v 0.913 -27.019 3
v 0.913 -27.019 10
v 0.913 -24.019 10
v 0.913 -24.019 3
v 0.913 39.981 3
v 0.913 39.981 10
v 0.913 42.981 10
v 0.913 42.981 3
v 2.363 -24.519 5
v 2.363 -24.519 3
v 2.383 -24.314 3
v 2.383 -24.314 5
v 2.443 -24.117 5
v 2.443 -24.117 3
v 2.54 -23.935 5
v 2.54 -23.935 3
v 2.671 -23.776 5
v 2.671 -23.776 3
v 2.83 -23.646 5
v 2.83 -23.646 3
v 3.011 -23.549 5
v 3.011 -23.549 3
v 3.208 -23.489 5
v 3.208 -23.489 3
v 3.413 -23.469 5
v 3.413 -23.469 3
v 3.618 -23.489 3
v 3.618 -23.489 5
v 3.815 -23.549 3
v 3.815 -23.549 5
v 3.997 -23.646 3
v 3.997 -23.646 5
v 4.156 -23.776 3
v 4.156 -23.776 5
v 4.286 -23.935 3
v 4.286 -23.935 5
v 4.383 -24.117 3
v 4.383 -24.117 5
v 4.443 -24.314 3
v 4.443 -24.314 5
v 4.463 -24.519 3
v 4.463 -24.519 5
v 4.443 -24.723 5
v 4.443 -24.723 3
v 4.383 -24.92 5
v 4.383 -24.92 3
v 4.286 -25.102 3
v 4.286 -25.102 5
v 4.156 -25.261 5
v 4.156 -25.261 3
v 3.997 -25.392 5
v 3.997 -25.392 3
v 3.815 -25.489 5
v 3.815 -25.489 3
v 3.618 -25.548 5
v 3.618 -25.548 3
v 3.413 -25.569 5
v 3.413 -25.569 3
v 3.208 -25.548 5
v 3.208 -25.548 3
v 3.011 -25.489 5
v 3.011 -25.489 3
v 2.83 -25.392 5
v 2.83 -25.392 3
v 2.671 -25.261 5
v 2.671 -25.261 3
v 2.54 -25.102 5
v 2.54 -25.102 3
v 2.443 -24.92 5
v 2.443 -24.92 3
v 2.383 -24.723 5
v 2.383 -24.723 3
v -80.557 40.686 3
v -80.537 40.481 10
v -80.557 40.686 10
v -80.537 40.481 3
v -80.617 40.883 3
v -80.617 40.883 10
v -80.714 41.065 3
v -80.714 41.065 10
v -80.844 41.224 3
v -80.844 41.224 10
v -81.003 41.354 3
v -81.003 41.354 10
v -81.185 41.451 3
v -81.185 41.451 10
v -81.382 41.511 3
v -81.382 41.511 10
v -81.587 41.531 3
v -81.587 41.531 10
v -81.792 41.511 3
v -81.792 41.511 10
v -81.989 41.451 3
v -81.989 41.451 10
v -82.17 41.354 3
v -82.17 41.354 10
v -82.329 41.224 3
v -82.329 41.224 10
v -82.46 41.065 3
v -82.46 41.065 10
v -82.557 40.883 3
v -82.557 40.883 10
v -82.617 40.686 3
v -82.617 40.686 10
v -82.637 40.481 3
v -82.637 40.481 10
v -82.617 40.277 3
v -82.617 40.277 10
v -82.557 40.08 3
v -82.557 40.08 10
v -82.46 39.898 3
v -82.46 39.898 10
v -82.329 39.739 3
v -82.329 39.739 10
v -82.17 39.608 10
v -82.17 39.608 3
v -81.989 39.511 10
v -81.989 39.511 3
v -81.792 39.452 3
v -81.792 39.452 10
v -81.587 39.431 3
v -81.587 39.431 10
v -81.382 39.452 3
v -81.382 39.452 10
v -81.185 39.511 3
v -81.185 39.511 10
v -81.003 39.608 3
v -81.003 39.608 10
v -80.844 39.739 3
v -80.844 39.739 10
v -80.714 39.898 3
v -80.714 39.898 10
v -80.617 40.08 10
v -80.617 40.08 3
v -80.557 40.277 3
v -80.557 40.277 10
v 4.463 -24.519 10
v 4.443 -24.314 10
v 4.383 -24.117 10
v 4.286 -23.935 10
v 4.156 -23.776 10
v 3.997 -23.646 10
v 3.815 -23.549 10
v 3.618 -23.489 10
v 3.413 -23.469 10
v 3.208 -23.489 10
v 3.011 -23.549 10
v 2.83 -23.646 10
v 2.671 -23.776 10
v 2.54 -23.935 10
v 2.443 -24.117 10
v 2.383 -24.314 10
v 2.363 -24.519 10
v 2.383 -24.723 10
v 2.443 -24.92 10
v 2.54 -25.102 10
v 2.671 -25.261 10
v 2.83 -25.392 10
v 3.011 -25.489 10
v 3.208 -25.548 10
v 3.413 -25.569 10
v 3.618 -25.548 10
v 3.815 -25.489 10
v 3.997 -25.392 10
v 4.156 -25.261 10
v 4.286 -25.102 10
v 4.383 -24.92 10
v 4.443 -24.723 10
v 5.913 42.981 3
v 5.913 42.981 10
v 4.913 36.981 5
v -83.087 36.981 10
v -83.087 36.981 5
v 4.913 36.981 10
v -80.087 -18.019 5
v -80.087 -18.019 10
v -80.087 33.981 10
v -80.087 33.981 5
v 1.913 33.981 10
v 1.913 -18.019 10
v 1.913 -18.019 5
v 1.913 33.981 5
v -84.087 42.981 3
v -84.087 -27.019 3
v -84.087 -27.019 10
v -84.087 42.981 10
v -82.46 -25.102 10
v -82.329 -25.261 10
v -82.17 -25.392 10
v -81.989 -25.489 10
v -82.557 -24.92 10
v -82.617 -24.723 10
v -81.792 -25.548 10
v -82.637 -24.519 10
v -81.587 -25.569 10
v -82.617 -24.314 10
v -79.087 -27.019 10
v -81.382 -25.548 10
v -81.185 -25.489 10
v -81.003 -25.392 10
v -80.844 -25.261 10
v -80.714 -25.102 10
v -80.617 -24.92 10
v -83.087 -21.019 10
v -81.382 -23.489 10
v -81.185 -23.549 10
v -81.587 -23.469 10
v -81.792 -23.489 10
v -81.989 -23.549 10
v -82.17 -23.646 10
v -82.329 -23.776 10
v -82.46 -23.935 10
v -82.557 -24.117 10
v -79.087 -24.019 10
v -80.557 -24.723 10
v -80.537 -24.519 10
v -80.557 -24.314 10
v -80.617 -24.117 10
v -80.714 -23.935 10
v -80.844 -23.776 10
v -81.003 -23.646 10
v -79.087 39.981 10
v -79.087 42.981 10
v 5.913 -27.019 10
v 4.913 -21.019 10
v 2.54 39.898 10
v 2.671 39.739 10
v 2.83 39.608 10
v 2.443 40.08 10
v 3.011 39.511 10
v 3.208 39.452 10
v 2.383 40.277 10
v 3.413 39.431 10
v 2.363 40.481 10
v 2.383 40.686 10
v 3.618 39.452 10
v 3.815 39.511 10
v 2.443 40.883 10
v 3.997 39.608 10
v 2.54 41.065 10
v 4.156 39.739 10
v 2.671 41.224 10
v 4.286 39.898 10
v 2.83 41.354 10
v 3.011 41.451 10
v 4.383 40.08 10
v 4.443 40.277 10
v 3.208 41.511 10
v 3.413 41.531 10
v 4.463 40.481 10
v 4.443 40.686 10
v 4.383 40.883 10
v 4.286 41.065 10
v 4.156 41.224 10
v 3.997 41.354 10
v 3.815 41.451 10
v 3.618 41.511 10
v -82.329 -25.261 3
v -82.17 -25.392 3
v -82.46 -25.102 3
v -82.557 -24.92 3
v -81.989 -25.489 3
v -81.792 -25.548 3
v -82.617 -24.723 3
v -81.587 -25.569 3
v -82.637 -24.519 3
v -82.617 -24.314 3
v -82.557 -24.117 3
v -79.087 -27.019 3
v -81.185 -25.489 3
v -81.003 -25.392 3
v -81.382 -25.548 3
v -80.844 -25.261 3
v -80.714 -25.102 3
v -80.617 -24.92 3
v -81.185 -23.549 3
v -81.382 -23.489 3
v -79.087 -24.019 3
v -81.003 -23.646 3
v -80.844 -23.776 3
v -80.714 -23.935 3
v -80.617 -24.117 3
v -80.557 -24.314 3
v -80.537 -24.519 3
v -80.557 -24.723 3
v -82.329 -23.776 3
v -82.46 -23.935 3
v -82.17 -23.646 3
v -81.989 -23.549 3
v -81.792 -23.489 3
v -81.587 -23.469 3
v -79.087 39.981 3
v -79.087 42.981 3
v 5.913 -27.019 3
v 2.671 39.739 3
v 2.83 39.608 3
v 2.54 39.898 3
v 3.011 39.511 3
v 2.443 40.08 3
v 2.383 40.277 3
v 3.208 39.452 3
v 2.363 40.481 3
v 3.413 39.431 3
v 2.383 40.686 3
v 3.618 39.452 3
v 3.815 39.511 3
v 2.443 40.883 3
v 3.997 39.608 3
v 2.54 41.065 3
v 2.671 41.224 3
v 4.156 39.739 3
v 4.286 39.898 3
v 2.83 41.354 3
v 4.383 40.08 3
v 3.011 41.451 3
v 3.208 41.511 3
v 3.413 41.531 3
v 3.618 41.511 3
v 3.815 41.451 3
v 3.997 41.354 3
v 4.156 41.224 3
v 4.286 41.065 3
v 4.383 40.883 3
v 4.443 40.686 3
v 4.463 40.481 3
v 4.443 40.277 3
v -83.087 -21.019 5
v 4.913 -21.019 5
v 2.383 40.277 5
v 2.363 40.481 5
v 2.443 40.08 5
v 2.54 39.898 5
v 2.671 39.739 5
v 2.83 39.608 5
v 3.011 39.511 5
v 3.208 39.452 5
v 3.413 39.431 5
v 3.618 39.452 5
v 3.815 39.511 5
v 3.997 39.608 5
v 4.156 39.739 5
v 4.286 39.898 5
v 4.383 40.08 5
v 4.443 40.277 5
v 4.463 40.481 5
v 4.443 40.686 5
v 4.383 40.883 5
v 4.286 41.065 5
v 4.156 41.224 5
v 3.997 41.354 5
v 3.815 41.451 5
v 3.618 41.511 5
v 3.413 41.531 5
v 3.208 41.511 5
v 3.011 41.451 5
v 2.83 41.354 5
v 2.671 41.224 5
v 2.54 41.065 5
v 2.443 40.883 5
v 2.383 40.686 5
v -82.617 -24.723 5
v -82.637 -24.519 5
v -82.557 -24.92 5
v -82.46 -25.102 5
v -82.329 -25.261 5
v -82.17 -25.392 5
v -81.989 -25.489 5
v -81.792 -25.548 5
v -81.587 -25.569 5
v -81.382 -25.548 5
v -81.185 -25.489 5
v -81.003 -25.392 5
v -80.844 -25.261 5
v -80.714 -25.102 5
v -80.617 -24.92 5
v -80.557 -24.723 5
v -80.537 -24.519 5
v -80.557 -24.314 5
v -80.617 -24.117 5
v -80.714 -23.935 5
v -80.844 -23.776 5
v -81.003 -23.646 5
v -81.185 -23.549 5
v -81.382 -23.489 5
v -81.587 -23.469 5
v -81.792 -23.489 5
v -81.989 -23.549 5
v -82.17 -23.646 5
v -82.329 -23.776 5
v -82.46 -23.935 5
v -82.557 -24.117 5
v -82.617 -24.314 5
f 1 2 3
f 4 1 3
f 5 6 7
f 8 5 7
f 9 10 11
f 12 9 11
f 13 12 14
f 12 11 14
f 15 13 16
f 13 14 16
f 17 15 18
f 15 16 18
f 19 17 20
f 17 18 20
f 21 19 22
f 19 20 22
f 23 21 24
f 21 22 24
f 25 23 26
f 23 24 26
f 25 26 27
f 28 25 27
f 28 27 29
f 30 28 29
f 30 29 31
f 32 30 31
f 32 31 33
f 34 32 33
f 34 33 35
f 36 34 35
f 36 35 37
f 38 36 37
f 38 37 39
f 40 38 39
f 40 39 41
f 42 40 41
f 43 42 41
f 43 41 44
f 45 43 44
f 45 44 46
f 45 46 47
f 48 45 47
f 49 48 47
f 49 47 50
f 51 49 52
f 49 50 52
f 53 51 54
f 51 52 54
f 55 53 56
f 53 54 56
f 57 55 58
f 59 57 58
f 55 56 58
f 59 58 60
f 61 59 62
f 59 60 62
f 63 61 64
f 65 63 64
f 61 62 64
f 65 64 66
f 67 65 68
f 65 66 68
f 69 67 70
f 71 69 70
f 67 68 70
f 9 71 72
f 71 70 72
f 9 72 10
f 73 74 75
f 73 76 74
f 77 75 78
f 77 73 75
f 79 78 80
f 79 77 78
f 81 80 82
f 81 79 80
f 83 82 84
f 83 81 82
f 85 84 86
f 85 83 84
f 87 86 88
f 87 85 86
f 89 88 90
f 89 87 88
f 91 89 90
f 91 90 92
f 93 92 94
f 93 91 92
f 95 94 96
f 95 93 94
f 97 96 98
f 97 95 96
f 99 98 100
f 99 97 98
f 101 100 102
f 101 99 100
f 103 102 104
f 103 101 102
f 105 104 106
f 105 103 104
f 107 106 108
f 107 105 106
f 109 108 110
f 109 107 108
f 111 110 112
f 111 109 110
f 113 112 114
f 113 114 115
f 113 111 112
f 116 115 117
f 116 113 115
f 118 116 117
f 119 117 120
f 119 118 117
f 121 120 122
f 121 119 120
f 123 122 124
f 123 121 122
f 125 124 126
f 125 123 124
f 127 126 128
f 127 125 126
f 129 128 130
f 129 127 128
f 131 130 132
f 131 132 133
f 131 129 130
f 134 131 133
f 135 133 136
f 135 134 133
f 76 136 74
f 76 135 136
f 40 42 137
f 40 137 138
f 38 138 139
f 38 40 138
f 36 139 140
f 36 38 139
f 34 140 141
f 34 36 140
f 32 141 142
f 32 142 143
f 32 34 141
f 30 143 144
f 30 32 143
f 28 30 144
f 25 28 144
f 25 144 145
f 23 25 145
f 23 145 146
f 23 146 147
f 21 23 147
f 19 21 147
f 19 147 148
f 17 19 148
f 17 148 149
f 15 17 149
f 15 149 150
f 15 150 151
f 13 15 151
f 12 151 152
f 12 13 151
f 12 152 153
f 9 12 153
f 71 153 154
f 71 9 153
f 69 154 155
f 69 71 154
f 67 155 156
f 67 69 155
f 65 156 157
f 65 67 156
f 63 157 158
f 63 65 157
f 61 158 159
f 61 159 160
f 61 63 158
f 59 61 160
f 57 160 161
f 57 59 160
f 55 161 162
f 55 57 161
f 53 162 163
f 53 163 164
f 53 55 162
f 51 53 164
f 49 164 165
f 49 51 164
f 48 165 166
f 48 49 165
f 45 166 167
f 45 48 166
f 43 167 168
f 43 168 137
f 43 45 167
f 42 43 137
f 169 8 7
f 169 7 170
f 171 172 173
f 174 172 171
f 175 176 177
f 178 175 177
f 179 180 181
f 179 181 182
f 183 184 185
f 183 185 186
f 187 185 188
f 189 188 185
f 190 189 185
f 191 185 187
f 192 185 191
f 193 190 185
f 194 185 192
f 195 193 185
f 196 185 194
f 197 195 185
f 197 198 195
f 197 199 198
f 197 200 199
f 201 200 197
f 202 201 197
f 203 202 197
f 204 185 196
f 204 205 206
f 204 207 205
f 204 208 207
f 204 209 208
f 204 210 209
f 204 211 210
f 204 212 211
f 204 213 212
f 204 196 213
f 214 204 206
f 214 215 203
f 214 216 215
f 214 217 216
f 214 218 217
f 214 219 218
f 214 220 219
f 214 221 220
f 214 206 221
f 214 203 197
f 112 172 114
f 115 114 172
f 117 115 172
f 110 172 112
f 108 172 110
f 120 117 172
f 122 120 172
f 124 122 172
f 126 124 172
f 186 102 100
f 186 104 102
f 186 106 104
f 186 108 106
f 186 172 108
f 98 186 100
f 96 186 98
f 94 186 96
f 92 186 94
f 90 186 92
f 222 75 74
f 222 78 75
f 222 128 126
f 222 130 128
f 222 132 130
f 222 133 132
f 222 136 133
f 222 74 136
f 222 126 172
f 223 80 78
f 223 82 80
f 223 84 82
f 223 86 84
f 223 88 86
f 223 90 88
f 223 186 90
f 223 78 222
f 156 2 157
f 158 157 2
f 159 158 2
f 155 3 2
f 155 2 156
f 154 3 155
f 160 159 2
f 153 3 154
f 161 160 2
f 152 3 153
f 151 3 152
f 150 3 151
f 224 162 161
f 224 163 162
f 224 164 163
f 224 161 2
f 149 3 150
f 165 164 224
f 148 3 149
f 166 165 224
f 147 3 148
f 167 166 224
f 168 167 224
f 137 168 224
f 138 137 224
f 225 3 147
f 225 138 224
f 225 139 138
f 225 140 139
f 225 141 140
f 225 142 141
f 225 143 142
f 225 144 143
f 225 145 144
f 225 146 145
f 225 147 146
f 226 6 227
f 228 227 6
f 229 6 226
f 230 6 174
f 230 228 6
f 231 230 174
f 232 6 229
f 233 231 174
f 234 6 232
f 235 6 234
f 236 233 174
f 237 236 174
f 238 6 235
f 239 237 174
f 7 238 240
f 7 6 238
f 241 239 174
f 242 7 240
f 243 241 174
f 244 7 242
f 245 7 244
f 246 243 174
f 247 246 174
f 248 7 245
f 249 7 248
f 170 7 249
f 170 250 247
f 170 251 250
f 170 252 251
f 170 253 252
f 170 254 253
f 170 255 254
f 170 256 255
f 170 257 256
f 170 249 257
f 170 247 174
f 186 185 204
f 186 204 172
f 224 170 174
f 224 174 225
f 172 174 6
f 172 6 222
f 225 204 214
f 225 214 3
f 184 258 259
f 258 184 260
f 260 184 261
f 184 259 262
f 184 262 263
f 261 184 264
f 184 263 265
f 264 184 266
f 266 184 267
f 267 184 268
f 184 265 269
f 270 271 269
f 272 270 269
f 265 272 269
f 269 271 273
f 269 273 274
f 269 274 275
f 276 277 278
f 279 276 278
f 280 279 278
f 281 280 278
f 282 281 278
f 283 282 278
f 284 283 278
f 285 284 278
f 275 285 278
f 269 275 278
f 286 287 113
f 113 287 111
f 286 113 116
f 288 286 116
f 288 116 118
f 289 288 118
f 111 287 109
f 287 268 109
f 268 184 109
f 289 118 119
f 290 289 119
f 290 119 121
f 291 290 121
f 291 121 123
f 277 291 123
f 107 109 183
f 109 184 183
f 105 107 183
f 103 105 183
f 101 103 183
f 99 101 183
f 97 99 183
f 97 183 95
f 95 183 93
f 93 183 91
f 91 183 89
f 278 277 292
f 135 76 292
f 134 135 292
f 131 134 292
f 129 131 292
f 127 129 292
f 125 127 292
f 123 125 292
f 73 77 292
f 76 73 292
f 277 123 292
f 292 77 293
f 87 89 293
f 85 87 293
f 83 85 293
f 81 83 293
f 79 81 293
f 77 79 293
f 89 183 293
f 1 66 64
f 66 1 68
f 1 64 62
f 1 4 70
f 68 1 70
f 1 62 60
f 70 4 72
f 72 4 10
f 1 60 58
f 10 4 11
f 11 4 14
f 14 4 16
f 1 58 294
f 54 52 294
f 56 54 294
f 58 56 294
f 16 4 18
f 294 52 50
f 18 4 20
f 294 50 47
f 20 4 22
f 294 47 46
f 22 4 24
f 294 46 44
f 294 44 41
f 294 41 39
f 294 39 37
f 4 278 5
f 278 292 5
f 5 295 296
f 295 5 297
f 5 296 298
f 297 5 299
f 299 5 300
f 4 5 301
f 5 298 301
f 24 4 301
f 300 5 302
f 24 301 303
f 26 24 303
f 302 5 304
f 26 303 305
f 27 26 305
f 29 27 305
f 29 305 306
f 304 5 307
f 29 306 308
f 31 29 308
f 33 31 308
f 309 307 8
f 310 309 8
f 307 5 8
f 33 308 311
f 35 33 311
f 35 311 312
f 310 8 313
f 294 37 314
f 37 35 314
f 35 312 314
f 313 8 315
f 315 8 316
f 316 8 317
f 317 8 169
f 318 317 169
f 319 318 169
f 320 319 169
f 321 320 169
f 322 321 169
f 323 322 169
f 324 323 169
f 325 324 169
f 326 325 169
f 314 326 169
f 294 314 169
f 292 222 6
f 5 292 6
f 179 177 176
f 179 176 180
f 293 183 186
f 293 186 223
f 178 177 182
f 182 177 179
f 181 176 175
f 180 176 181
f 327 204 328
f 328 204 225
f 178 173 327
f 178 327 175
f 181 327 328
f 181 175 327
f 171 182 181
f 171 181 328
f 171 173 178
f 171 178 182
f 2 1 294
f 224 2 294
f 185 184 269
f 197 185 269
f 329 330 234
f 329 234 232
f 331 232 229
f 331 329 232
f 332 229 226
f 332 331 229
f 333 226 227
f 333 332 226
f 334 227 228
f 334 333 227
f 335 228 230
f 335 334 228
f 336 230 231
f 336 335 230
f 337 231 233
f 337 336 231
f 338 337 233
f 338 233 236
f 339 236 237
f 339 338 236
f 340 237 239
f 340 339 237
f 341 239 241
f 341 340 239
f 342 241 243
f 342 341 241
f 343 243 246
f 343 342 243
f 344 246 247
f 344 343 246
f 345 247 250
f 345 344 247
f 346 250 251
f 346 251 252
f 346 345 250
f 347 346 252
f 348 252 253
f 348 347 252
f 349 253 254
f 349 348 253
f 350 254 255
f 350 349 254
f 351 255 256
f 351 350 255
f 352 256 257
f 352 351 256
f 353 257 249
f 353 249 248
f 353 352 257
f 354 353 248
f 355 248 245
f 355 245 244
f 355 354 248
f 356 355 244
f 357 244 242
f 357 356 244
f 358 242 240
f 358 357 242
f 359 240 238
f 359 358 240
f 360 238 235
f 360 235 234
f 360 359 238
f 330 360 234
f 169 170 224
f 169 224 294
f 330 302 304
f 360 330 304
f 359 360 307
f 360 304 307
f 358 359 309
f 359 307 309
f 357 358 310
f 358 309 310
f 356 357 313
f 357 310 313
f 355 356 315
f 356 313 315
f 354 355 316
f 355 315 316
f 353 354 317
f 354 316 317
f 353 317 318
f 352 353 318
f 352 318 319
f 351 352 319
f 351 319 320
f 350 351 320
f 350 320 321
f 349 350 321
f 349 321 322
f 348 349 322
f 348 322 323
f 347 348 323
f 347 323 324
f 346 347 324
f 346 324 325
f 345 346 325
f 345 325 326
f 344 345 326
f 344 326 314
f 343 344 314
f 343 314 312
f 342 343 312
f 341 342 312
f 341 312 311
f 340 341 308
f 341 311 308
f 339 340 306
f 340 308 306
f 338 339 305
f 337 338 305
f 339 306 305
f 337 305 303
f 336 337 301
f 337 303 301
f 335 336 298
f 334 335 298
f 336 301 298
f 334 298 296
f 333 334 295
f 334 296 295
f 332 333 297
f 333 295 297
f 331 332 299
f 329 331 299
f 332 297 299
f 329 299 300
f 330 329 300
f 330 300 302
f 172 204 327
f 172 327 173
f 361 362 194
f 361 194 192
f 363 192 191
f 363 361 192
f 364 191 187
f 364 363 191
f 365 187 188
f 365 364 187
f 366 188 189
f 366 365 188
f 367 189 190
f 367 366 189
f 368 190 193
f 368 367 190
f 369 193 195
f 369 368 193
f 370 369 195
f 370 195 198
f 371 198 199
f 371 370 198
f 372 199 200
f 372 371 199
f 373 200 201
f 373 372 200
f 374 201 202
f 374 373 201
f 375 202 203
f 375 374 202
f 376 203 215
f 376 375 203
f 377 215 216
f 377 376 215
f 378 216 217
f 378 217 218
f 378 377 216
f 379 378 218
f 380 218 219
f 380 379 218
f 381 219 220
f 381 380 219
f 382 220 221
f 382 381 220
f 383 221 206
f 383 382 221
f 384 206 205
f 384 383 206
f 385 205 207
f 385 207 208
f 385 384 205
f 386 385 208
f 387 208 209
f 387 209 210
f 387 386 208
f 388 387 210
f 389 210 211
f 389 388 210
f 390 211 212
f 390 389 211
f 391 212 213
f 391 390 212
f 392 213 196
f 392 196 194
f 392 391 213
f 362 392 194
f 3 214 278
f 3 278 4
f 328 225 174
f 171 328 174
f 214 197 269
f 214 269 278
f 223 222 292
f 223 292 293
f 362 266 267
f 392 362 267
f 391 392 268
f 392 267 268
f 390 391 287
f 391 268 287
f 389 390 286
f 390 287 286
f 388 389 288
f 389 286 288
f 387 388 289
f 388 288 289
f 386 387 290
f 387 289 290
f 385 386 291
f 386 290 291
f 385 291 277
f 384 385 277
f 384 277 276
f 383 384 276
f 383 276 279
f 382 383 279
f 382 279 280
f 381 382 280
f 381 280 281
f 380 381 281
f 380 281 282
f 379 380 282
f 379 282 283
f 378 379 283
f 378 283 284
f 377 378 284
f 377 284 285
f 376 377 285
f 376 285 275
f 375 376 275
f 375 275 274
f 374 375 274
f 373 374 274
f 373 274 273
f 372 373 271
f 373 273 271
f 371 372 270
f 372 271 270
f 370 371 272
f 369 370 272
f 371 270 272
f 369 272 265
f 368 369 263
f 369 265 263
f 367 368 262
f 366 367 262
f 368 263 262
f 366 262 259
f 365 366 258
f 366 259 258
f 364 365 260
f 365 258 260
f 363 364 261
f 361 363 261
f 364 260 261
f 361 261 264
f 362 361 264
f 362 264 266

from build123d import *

# Parameters (mm, degrees)
SKETCH_1_W           = 100
SKETCH_1_H           = 70
EXTRUDE_1_DEPTH      = 10
SKETCH_6_W           = 5
SKETCH_6_H           = 5
CUT_EXTRUDE_4_DEPTH  = 5
SKETCH_7_W           = 5
SKETCH_7_H           = 5
CUT_EXTRUDE_5_DEPTH  = 3
SKETCH_8_R           = 1.05
CUT_EXTRUDE_6_DEPTH  = 42
SKETCH_10_W          = 100
SKETCH_10_H          = 70
CUT_EXTRUDE_7_DEPTH  = 3
SKETCH_11_W          = 7
SKETCH_11_H          = 70
CUT_EXTRUDE_8_DEPTH  = 5
SKETCH_12_W          = 7
SKETCH_12_H          = 70
CUT_EXTRUDE_9_DEPTH  = 5
SKETCH_15_W          = 88
SKETCH_15_H          = 58
SKETCH_15_W_2        = 82
SKETCH_15_H_2        = 52
CUT_EXTRUDE_12_DEPTH = 5
SKETCH_16_W          = 5
SKETCH_16_H          = 5
SKETCH_16_R          = 1.05
EXTRUDE_2_DEPTH      = 5
SKETCH_18_W          = 80
SKETCH_18_H          = 3
CUT_EXTRUDE_13_DEPTH = 10


with BuildPart() as part:
    # 草圖1 → 填料-伸長1 (new body)
    with BuildSketch(Plane.XY):
        with Locations((-39.08671555, 7.98136646)):
            Rectangle(SKETCH_1_W, SKETCH_1_H)
    extrude(amount=EXTRUDE_1_DEPTH)

    # 草圖6 → 除料-伸長4 (cut)
    with BuildSketch(Plane.XY.offset(10)):
        with Locations((3.41328445, 40.48136646)):
            Rectangle(SKETCH_6_W, SKETCH_6_H)
        with Locations((-81.58671555, 40.48136646)):
            Rectangle(SKETCH_6_W, SKETCH_6_H)
        with Locations((-81.58671555, -24.51863354)):
            Rectangle(SKETCH_6_W, SKETCH_6_H)
        with Locations((3.41328445, -24.51863354)):
            Rectangle(SKETCH_6_W, SKETCH_6_H)
    extrude(amount=-CUT_EXTRUDE_4_DEPTH, mode=Mode.SUBTRACT)

    # 草圖7 → 除料-伸長5 (cut)
    with BuildSketch(Plane(origin=(0, 0, 0), x_dir=(-1, 0, 0), z_dir=(0, 0, -1))):
        with Locations((81.58671555, 40.48136646)):
            Rectangle(SKETCH_7_W, SKETCH_7_H)
        with Locations((-3.41328445, 40.48136646)):
            Rectangle(SKETCH_7_W, SKETCH_7_H)
        with Locations((81.58671555, -24.51863354)):
            Rectangle(SKETCH_7_W, SKETCH_7_H)
        with Locations((-3.41328445, -24.51863354)):
            Rectangle(SKETCH_7_W, SKETCH_7_H)
    extrude(amount=-CUT_EXTRUDE_5_DEPTH, mode=Mode.SUBTRACT)

    # 草圖8 → 除料-伸長6 (cut)
    with BuildSketch(Plane(origin=(0, 0, 0), x_dir=(-1, 0, 0), z_dir=(0, 0, -1))):
        with Locations((-3.41328445, 40.48136646)):
            Circle(SKETCH_8_R)
        with Locations(Location((81.58671555, 40.48136646, 0), (0, 0, 180))):
            Circle(SKETCH_8_R)
        with Locations((81.58671555, -24.51863354)):
            Circle(SKETCH_8_R)
        with Locations((-3.41328445, -24.51863354)):
            Circle(SKETCH_8_R)
    extrude(amount=-CUT_EXTRUDE_6_DEPTH, mode=Mode.SUBTRACT)

    # 草圖10 → 除料-伸長7 (cut)
    with BuildSketch(Plane.XY):
        with Locations((-39.08671555, 7.98136646)):
            Rectangle(SKETCH_10_W, SKETCH_10_H)
    extrude(amount=CUT_EXTRUDE_7_DEPTH, mode=Mode.SUBTRACT)

    # 草圖11 → 除料-伸長8 (cut)
    with BuildSketch(Plane(origin=(10.91328445, 0, 0), x_dir=(0, 0, -1), z_dir=(1, 0, 0))):
        with Locations((-6.5, 7.98136646)):
            Rectangle(SKETCH_11_W, SKETCH_11_H)
    extrude(amount=-CUT_EXTRUDE_8_DEPTH, mode=Mode.SUBTRACT)

    # 草圖12 → 除料-伸長9 (cut)
    with BuildSketch(Plane.ZY.offset(89.08671555)):
        with Locations((6.5, 7.98136646)):
            Rectangle(SKETCH_12_W, SKETCH_12_H)
    extrude(amount=-CUT_EXTRUDE_9_DEPTH, mode=Mode.SUBTRACT)

    # 草圖15 → 除料-伸長12 (cut)
    with BuildSketch(Plane.XY.offset(10)):
        with Locations((-39.08671555, 7.98136646)):
            Rectangle(SKETCH_15_W, SKETCH_15_H)
        with Locations((-39.08671555, 7.98136646)):
            Rectangle(SKETCH_15_W_2, SKETCH_15_H_2, mode=Mode.SUBTRACT)
    extrude(amount=-CUT_EXTRUDE_12_DEPTH, mode=Mode.SUBTRACT)

    # 草圖16 → 填料-伸長2 (add)
    with BuildSketch(Plane.XY.offset(5)):
        with Locations((-81.58671555, 40.48136646)):
            Rectangle(SKETCH_16_W, SKETCH_16_H)
        with Locations((-81.58671555, 40.48136646)):
            Circle(SKETCH_16_R, mode=Mode.SUBTRACT)
        with Locations((3.41328445, 40.48136646)):
            Rectangle(SKETCH_16_W, SKETCH_16_H)
        with Locations(Location((3.41328445, 40.48136646, 0), (0, 0, 180))):
            Circle(SKETCH_16_R, mode=Mode.SUBTRACT)
        with Locations((3.41328445, -24.51863354)):
            Rectangle(SKETCH_16_W, SKETCH_16_H)
        with Locations((3.41328445, -24.51863354)):
            Circle(SKETCH_16_R, mode=Mode.SUBTRACT)
        with Locations((-81.58671555, -24.51863354)):
            Rectangle(SKETCH_16_W, SKETCH_16_H)
        with Locations(Location((-81.58671555, -24.51863354, 0), (0, 0, 180))):
            Circle(SKETCH_16_R, mode=Mode.SUBTRACT)
    extrude(amount=EXTRUDE_2_DEPTH)

    # 草圖18 → 除料-伸長13 (cut)
    with BuildSketch(Plane.XY.offset(10)):
        with Locations((-39.08671555, 41.48136646)):
            Rectangle(SKETCH_18_W, SKETCH_18_H)
        with Locations((-39.08671555, -25.51863354)):
            Rectangle(SKETCH_18_W, SKETCH_18_H)
    extrude(amount=-CUT_EXTRUDE_13_DEPTH, mode=Mode.SUBTRACT)


solid = part.part
